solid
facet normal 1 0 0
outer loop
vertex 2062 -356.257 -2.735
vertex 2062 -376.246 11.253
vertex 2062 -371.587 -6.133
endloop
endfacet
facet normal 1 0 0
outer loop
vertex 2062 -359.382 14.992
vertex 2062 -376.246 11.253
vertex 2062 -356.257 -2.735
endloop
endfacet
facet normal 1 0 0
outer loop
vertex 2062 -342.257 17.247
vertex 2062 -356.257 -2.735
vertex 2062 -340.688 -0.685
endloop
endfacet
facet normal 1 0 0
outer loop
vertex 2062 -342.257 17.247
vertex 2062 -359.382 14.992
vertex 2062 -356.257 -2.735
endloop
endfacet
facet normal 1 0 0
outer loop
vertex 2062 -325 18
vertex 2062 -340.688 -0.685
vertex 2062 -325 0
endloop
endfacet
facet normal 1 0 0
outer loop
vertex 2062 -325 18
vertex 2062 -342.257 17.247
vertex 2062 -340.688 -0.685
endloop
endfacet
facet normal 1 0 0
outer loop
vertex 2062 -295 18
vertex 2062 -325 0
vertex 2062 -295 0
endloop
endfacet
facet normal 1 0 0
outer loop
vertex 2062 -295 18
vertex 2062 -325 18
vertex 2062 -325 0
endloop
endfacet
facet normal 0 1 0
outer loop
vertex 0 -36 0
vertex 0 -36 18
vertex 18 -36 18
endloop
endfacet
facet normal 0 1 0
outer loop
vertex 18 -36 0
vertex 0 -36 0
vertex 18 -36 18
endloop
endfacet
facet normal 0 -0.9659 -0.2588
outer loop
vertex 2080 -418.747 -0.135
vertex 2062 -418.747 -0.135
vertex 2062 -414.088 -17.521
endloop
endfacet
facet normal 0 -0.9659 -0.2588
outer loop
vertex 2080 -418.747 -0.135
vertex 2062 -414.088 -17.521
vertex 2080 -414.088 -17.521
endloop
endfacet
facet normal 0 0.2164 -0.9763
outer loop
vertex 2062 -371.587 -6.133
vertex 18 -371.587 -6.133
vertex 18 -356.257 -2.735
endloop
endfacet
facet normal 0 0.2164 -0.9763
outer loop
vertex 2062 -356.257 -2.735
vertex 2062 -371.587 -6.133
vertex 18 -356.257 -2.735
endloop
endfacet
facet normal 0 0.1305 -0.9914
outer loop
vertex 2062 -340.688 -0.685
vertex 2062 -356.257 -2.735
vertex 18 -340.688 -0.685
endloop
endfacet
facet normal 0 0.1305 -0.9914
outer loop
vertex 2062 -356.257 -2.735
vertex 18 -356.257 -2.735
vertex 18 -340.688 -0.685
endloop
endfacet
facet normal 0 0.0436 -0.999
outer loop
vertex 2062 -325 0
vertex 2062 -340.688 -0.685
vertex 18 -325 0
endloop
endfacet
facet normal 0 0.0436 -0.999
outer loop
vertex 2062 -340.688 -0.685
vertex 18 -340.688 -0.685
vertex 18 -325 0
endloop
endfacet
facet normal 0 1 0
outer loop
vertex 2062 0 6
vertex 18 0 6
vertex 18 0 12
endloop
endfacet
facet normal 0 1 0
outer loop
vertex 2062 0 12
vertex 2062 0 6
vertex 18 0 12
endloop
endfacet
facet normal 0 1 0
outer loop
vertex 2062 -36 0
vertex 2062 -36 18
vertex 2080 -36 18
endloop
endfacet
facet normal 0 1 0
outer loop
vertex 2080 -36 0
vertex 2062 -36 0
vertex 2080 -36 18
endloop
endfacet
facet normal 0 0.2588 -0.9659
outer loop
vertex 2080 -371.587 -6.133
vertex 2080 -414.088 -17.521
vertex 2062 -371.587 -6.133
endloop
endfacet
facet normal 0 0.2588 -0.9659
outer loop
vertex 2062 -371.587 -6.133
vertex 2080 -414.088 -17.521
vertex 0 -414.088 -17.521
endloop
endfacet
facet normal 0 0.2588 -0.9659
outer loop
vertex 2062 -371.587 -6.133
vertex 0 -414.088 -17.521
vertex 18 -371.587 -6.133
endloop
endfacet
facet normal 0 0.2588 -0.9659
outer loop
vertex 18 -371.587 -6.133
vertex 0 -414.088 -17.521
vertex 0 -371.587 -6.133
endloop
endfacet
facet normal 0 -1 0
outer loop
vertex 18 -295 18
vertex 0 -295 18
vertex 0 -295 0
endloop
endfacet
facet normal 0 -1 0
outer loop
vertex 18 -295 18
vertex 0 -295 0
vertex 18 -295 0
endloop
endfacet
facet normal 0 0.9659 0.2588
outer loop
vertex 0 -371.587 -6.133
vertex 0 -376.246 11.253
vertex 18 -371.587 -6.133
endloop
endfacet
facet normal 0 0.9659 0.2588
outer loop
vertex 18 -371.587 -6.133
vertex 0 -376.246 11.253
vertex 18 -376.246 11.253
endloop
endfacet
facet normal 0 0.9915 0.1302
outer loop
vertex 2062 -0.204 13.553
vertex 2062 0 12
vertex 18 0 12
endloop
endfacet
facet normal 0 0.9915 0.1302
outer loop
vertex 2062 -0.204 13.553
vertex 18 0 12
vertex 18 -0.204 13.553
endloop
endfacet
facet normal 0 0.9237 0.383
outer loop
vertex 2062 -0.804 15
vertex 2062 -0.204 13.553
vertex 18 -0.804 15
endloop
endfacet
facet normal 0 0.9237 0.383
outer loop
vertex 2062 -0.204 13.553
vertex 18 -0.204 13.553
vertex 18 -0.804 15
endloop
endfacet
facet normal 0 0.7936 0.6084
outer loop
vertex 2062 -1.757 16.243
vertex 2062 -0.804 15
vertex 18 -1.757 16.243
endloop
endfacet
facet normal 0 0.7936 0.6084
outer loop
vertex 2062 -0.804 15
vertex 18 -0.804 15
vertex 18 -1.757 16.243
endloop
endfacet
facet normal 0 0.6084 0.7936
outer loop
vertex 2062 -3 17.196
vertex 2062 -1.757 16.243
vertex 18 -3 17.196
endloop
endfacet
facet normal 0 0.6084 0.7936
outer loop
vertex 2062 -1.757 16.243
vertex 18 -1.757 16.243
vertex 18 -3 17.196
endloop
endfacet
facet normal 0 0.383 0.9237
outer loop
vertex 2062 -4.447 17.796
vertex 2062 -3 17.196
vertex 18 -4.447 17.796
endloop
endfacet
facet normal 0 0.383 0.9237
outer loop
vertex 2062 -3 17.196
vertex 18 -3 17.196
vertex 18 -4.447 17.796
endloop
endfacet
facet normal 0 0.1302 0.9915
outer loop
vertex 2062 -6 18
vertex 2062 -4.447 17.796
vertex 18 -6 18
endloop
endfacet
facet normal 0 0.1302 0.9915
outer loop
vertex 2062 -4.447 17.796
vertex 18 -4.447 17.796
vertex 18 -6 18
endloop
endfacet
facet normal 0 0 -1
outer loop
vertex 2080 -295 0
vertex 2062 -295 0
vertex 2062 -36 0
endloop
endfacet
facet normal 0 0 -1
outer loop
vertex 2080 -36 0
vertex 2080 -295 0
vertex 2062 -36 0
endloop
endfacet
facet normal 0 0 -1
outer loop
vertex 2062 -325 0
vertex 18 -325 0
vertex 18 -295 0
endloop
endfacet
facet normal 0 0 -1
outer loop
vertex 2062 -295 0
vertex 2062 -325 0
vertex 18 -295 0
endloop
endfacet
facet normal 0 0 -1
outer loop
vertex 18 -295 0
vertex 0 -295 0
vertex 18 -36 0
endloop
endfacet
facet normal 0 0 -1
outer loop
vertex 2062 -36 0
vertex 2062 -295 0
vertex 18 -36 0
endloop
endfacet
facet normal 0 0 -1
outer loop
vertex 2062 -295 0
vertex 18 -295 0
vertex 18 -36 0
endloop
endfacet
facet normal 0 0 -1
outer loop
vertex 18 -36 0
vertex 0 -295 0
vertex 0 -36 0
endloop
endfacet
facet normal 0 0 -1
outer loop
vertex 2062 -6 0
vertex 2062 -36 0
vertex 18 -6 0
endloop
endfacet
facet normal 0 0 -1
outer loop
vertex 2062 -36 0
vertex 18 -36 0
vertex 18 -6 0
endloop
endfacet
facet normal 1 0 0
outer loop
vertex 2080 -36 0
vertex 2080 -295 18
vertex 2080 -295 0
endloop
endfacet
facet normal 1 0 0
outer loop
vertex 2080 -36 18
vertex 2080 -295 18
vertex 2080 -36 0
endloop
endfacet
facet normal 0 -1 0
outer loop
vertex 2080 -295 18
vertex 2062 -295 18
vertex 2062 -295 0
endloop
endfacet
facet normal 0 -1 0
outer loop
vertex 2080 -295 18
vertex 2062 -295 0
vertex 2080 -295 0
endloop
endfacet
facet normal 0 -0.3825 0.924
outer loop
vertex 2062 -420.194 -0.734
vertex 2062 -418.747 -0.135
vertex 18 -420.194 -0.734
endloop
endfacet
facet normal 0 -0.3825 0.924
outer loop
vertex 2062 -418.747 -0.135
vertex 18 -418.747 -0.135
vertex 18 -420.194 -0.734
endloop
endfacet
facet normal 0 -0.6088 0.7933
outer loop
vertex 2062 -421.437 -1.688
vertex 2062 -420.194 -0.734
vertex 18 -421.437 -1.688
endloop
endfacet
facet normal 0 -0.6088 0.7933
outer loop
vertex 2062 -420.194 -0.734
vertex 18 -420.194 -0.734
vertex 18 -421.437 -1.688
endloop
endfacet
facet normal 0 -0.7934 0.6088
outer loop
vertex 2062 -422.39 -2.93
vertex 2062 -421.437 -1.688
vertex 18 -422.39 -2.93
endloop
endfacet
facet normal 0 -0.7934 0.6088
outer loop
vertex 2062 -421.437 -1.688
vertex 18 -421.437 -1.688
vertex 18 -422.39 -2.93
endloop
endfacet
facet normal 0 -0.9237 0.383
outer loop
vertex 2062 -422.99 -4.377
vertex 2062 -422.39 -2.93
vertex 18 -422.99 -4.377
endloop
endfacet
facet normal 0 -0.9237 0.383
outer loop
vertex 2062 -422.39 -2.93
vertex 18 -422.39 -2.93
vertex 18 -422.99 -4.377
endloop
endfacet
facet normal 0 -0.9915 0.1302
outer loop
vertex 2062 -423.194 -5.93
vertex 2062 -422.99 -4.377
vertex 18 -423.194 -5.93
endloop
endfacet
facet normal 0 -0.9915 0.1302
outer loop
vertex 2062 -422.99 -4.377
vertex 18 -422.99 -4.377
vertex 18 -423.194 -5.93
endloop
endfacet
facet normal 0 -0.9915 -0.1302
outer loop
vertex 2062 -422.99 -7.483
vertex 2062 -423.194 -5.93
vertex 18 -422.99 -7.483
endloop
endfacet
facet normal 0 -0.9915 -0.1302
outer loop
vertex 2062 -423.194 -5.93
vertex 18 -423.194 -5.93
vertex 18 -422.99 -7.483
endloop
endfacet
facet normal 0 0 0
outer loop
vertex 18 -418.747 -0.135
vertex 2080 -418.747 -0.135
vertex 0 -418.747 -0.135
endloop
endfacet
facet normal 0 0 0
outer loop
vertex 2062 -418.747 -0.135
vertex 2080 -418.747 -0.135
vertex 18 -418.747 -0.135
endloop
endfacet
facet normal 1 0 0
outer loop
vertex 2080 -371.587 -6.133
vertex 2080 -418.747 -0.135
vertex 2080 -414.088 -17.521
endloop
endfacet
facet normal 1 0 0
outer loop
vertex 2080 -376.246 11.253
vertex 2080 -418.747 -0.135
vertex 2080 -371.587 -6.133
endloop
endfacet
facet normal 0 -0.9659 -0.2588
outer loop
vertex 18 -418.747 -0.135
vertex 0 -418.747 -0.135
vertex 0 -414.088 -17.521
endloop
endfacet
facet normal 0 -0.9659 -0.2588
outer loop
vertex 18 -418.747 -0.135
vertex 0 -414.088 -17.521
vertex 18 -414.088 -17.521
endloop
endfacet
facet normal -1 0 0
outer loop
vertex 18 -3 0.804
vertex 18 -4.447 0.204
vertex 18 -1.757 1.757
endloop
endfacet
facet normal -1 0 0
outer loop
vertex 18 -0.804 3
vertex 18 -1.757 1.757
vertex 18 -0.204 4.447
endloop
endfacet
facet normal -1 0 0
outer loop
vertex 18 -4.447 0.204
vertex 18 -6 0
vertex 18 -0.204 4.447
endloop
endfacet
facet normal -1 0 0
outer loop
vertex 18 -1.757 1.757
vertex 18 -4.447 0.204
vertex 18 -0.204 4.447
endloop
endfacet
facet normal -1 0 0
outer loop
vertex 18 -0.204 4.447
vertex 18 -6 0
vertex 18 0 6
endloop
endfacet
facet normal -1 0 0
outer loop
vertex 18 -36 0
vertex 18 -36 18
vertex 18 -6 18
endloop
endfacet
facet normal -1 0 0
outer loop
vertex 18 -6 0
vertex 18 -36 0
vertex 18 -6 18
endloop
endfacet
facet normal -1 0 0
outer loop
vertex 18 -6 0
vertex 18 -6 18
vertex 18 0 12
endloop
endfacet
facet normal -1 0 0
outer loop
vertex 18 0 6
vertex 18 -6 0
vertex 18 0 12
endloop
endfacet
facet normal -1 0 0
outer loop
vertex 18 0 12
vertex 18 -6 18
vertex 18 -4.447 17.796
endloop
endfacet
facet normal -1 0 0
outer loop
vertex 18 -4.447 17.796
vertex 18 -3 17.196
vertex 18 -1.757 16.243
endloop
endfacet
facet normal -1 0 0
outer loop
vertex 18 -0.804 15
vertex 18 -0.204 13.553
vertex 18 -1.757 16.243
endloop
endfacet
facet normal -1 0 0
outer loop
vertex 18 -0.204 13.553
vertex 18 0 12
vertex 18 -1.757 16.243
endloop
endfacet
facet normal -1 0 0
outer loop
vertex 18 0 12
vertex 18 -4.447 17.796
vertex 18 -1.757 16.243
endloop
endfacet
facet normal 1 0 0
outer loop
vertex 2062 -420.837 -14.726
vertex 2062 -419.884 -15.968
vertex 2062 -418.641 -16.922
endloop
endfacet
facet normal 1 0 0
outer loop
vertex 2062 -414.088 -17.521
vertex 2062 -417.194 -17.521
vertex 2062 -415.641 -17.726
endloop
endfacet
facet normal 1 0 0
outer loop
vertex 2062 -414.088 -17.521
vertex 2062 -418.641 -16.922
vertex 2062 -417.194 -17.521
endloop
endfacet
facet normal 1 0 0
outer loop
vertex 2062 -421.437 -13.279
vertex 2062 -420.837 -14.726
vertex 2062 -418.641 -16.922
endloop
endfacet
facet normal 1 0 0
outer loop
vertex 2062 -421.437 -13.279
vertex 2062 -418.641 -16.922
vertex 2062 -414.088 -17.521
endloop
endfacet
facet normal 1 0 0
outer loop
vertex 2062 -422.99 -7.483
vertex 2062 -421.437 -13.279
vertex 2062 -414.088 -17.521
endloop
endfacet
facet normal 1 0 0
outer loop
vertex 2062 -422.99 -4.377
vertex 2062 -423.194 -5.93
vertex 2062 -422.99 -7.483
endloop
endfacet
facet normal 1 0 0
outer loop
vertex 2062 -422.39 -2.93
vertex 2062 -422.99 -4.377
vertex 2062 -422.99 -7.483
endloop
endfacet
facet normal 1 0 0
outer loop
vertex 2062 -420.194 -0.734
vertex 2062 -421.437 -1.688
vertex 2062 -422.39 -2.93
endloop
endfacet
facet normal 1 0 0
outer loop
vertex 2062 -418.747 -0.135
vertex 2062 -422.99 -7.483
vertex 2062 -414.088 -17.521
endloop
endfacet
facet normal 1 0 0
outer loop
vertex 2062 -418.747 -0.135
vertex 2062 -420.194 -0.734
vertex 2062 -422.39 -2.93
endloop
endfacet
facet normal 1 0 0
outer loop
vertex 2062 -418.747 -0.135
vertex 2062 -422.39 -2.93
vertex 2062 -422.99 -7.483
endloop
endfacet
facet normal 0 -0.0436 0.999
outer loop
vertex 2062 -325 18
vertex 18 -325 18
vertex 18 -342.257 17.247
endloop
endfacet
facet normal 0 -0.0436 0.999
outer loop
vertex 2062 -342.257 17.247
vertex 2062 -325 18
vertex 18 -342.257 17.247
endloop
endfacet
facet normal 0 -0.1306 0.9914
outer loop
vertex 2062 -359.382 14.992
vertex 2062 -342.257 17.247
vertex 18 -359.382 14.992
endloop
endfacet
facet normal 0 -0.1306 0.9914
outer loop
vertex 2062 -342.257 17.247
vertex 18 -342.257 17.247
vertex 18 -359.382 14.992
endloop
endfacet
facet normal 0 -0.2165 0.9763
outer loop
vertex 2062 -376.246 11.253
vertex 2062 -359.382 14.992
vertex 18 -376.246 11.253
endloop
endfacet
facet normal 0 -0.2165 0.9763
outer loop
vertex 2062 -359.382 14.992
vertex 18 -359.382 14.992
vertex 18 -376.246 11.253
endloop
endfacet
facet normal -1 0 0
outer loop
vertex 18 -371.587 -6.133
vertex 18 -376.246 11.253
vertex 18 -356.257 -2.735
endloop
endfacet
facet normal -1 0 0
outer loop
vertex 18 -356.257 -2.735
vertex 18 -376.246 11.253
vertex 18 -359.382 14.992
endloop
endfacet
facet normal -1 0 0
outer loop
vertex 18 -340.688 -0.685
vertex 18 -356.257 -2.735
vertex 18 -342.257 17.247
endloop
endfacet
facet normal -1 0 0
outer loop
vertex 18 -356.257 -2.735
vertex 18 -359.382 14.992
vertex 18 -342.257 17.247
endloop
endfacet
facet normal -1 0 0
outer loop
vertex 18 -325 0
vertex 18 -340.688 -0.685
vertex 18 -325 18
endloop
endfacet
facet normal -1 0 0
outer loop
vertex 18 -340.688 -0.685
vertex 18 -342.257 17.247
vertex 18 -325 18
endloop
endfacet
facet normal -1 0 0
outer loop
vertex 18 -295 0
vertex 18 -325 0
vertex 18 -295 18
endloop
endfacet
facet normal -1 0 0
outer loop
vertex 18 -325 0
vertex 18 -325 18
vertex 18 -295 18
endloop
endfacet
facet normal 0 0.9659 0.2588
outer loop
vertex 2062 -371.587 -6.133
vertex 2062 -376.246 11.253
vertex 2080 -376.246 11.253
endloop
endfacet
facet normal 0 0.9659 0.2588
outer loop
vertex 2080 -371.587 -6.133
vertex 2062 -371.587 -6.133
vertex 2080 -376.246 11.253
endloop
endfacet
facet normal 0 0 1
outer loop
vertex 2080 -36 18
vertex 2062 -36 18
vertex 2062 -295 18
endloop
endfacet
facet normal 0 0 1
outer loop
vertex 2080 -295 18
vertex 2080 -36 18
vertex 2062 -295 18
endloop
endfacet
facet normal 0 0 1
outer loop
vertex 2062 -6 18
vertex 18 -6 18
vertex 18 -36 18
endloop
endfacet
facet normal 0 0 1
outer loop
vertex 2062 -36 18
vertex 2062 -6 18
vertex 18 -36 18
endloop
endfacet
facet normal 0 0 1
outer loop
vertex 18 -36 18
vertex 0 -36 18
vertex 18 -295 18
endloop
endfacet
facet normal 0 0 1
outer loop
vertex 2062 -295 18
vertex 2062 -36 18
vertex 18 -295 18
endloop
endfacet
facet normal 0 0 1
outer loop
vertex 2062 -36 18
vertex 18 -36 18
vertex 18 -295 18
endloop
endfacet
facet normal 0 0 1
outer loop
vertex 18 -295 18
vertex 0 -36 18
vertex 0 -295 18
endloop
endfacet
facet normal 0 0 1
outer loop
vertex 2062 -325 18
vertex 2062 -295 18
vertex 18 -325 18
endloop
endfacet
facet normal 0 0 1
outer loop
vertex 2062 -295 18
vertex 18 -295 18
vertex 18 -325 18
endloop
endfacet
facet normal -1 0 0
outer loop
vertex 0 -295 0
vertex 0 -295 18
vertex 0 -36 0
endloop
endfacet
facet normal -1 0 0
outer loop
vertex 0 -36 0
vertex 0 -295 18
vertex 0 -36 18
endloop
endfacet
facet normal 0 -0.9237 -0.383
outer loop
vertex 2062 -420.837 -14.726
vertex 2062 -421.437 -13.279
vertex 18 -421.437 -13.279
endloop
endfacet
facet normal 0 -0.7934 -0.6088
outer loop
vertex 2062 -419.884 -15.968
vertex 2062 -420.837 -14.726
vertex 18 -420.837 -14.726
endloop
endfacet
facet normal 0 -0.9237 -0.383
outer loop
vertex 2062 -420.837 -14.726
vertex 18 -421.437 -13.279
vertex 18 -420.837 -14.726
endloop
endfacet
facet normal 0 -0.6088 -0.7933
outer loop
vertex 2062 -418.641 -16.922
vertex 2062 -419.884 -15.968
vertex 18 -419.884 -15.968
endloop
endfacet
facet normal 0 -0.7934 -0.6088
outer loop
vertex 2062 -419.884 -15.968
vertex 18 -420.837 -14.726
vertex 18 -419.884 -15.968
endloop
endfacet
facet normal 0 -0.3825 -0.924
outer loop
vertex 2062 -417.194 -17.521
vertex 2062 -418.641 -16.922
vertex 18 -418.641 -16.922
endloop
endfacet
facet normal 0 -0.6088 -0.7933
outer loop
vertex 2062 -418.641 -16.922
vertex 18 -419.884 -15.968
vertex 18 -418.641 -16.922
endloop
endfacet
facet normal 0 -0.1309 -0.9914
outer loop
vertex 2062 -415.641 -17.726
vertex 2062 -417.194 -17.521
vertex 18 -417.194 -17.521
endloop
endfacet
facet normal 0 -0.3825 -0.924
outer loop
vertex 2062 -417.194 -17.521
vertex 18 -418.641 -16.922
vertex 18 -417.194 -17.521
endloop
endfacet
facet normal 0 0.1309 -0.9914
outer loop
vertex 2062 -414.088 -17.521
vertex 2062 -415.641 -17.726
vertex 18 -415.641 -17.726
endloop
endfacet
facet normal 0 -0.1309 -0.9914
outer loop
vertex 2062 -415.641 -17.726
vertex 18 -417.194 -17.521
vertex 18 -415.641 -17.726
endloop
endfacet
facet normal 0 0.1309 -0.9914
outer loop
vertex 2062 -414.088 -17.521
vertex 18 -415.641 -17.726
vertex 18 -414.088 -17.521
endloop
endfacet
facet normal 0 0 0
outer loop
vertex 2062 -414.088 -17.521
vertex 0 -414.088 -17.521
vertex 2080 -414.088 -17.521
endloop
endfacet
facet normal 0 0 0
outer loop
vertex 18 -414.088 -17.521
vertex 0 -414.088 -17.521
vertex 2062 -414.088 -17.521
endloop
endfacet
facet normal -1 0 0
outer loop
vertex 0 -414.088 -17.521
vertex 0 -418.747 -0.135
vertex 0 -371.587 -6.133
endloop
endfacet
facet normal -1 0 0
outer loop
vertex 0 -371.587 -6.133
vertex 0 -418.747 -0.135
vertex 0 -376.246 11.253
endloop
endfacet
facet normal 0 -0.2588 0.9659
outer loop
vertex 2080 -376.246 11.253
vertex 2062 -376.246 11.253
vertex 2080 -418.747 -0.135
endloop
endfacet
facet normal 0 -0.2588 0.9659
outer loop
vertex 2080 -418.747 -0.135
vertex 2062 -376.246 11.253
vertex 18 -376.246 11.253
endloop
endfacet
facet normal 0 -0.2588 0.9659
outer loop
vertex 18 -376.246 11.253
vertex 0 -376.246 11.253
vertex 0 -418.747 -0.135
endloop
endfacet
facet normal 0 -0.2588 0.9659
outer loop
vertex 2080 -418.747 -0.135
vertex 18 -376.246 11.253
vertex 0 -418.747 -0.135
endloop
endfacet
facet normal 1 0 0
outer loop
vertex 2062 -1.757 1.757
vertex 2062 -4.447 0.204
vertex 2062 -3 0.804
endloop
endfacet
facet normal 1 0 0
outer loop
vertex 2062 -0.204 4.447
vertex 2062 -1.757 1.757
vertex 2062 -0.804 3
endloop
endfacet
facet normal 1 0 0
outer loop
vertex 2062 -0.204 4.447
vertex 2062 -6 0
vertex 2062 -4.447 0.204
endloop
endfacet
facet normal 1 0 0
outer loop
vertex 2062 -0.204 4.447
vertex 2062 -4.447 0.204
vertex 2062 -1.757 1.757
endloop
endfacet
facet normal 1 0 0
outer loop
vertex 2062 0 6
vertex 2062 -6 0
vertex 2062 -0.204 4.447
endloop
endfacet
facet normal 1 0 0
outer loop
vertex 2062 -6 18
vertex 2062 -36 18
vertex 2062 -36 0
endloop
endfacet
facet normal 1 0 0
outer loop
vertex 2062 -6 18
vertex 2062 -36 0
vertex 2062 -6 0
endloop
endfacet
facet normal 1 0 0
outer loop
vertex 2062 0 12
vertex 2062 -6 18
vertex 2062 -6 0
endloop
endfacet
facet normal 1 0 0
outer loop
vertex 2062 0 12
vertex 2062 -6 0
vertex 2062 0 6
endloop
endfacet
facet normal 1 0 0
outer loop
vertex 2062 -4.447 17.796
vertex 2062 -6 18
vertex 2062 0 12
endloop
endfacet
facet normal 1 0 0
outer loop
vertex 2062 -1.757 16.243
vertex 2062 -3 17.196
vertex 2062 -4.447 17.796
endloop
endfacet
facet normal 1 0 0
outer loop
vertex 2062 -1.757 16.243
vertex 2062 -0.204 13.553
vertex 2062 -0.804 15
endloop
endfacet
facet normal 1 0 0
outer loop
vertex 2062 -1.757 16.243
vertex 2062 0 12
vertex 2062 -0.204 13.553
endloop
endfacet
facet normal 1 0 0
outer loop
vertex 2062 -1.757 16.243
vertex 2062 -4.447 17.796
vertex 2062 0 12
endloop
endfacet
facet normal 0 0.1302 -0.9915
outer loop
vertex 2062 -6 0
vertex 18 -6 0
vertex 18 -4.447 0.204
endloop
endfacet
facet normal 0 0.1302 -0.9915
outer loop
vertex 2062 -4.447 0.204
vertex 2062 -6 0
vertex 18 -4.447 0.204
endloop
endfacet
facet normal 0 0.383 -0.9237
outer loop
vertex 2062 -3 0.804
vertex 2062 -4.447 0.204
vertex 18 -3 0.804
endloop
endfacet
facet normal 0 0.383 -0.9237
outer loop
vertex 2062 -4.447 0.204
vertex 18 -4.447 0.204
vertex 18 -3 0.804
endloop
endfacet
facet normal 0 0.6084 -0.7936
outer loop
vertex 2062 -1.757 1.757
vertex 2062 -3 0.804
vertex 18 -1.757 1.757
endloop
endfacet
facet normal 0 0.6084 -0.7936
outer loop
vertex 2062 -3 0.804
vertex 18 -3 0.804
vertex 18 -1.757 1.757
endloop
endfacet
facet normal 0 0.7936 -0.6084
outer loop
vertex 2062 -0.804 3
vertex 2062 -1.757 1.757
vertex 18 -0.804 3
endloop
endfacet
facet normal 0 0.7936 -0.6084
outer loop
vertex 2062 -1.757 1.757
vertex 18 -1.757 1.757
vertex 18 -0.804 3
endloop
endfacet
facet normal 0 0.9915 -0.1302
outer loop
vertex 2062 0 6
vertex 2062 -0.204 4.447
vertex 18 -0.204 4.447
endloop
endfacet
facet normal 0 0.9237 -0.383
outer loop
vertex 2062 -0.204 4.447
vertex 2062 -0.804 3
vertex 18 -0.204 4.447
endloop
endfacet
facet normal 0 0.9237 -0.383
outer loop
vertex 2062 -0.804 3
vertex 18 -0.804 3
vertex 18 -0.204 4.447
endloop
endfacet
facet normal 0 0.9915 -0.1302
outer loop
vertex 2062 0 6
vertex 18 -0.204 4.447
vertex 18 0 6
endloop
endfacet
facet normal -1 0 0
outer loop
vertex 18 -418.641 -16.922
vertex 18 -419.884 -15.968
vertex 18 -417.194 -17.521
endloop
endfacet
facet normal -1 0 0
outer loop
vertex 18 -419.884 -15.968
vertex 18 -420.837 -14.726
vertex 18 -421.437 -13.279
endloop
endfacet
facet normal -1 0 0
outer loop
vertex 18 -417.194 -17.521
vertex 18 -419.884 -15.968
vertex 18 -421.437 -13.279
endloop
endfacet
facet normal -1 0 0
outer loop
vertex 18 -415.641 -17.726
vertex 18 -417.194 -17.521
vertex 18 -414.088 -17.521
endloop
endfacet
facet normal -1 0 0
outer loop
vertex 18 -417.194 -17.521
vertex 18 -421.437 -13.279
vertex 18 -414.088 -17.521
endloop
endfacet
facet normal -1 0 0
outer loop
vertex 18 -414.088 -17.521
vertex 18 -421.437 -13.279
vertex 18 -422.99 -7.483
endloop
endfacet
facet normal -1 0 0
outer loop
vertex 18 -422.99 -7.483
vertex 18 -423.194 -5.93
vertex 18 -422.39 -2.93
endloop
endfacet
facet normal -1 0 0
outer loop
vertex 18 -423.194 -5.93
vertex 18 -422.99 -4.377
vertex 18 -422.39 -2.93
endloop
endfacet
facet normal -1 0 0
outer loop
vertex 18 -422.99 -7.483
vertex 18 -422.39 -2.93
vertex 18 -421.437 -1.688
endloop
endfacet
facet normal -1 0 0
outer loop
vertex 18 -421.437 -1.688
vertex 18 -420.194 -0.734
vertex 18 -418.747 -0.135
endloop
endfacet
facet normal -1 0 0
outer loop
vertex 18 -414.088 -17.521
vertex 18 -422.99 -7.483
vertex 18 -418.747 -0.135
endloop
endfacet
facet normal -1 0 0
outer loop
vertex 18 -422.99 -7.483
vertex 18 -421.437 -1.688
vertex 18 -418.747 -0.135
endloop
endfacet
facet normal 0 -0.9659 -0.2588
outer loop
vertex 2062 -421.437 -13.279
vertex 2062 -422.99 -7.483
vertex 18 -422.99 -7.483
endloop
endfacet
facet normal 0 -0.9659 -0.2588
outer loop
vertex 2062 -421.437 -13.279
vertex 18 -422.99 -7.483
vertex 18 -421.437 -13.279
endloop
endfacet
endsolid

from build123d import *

# Parameters (mm, degrees)
F1_DEPTH = 2080
F2_W     = 39.969242
F2_H     = 51.200114
F2_H_2   = 66.946672
F2_W_2   = 34.220117
F2_H_3   = 62.673524
F3_DEPTH = 25
F4_W     = 37.147605
F4_H     = 21.549247
F4_H_2   = 14.081187
F4_W_2   = 32.29431
F4_H_3   = 23.482673
F4_H_4   = 16.907938
F5_DEPTH = 25


with BuildPart() as f1:
    # F0 (on Right) → F1 (new body)
    with BuildSketch(Plane.YZ):
        with BuildLine():
            Line((-325, 0), (-6, 0))
            ThreePointArc((-6, 0), (-1.757359, 1.757359), (0, 6))
            Line((0, 6), (0, 12))
            ThreePointArc((0, 12), (-1.757359, 16.242641), (-6, 18))
            Line((-6, 18), (-325, 18))
            ThreePointArc((-325, 18), (-350.844186, 16.306083), (-376.246171, 11.253314))
            Line((-376.246171, 11.253314), (-418.746907, -0.134724))
            ThreePointArc((-418.746907, -0.134724), (-422.390145, -2.930279), (-422.989548, -7.483194))
            Line((-422.989548, -7.483194), (-421.436634, -13.278749))
            ThreePointArc((-421.436634, -13.278749), (-418.641079, -16.921987), (-414.088164, -17.521389))
            Line((-414.088164, -17.521389), (-371.587428, -6.133351))
            ThreePointArc((-371.587428, -6.133351), (-348.494715, -1.539925), (-325, 0))
        make_face()
    extrude(amount=F1_DEPTH)

    # F2 (on face) → F3 (cut)
    with BuildSketch(Plane.XY.offset(18)):
        with Locations((2081.984621, -10.399943)):
            Rectangle(F2_W, F2_H)
        with Locations((2081.984621, -328.473336)):
            Rectangle(F2_W, F2_H_2)
        with Locations((0.889942, -328.473336)):
            Rectangle(F2_W_2, F2_H_2)
        with Locations((0.889942, -4.663238)):
            Rectangle(F2_W_2, F2_H_3)
    extrude(amount=-F3_DEPTH, mode=Mode.SUBTRACT)

    # F4 (on face) → F5 (cut)
    with BuildSketch(Plane(origin=(0, -28.017043, 104.561027), x_dir=(1, 0, 0), z_dir=(0, -0.258819, 0.965926))):
        with Locations((-0.573802, -349.738698)):
            Rectangle(F4_W, F4_H)
        with Locations((-0.573802, -411.553915)):
            Rectangle(F4_W, F4_H_2)
        with Locations((2078.147155, -348.771985)):
            Rectangle(F4_W_2, F4_H_3)
        with Locations((2078.147155, -412.967291)):
            Rectangle(F4_W_2, F4_H_4)
    extrude(amount=-F5_DEPTH, mode=Mode.SUBTRACT)


solid = f1.part
